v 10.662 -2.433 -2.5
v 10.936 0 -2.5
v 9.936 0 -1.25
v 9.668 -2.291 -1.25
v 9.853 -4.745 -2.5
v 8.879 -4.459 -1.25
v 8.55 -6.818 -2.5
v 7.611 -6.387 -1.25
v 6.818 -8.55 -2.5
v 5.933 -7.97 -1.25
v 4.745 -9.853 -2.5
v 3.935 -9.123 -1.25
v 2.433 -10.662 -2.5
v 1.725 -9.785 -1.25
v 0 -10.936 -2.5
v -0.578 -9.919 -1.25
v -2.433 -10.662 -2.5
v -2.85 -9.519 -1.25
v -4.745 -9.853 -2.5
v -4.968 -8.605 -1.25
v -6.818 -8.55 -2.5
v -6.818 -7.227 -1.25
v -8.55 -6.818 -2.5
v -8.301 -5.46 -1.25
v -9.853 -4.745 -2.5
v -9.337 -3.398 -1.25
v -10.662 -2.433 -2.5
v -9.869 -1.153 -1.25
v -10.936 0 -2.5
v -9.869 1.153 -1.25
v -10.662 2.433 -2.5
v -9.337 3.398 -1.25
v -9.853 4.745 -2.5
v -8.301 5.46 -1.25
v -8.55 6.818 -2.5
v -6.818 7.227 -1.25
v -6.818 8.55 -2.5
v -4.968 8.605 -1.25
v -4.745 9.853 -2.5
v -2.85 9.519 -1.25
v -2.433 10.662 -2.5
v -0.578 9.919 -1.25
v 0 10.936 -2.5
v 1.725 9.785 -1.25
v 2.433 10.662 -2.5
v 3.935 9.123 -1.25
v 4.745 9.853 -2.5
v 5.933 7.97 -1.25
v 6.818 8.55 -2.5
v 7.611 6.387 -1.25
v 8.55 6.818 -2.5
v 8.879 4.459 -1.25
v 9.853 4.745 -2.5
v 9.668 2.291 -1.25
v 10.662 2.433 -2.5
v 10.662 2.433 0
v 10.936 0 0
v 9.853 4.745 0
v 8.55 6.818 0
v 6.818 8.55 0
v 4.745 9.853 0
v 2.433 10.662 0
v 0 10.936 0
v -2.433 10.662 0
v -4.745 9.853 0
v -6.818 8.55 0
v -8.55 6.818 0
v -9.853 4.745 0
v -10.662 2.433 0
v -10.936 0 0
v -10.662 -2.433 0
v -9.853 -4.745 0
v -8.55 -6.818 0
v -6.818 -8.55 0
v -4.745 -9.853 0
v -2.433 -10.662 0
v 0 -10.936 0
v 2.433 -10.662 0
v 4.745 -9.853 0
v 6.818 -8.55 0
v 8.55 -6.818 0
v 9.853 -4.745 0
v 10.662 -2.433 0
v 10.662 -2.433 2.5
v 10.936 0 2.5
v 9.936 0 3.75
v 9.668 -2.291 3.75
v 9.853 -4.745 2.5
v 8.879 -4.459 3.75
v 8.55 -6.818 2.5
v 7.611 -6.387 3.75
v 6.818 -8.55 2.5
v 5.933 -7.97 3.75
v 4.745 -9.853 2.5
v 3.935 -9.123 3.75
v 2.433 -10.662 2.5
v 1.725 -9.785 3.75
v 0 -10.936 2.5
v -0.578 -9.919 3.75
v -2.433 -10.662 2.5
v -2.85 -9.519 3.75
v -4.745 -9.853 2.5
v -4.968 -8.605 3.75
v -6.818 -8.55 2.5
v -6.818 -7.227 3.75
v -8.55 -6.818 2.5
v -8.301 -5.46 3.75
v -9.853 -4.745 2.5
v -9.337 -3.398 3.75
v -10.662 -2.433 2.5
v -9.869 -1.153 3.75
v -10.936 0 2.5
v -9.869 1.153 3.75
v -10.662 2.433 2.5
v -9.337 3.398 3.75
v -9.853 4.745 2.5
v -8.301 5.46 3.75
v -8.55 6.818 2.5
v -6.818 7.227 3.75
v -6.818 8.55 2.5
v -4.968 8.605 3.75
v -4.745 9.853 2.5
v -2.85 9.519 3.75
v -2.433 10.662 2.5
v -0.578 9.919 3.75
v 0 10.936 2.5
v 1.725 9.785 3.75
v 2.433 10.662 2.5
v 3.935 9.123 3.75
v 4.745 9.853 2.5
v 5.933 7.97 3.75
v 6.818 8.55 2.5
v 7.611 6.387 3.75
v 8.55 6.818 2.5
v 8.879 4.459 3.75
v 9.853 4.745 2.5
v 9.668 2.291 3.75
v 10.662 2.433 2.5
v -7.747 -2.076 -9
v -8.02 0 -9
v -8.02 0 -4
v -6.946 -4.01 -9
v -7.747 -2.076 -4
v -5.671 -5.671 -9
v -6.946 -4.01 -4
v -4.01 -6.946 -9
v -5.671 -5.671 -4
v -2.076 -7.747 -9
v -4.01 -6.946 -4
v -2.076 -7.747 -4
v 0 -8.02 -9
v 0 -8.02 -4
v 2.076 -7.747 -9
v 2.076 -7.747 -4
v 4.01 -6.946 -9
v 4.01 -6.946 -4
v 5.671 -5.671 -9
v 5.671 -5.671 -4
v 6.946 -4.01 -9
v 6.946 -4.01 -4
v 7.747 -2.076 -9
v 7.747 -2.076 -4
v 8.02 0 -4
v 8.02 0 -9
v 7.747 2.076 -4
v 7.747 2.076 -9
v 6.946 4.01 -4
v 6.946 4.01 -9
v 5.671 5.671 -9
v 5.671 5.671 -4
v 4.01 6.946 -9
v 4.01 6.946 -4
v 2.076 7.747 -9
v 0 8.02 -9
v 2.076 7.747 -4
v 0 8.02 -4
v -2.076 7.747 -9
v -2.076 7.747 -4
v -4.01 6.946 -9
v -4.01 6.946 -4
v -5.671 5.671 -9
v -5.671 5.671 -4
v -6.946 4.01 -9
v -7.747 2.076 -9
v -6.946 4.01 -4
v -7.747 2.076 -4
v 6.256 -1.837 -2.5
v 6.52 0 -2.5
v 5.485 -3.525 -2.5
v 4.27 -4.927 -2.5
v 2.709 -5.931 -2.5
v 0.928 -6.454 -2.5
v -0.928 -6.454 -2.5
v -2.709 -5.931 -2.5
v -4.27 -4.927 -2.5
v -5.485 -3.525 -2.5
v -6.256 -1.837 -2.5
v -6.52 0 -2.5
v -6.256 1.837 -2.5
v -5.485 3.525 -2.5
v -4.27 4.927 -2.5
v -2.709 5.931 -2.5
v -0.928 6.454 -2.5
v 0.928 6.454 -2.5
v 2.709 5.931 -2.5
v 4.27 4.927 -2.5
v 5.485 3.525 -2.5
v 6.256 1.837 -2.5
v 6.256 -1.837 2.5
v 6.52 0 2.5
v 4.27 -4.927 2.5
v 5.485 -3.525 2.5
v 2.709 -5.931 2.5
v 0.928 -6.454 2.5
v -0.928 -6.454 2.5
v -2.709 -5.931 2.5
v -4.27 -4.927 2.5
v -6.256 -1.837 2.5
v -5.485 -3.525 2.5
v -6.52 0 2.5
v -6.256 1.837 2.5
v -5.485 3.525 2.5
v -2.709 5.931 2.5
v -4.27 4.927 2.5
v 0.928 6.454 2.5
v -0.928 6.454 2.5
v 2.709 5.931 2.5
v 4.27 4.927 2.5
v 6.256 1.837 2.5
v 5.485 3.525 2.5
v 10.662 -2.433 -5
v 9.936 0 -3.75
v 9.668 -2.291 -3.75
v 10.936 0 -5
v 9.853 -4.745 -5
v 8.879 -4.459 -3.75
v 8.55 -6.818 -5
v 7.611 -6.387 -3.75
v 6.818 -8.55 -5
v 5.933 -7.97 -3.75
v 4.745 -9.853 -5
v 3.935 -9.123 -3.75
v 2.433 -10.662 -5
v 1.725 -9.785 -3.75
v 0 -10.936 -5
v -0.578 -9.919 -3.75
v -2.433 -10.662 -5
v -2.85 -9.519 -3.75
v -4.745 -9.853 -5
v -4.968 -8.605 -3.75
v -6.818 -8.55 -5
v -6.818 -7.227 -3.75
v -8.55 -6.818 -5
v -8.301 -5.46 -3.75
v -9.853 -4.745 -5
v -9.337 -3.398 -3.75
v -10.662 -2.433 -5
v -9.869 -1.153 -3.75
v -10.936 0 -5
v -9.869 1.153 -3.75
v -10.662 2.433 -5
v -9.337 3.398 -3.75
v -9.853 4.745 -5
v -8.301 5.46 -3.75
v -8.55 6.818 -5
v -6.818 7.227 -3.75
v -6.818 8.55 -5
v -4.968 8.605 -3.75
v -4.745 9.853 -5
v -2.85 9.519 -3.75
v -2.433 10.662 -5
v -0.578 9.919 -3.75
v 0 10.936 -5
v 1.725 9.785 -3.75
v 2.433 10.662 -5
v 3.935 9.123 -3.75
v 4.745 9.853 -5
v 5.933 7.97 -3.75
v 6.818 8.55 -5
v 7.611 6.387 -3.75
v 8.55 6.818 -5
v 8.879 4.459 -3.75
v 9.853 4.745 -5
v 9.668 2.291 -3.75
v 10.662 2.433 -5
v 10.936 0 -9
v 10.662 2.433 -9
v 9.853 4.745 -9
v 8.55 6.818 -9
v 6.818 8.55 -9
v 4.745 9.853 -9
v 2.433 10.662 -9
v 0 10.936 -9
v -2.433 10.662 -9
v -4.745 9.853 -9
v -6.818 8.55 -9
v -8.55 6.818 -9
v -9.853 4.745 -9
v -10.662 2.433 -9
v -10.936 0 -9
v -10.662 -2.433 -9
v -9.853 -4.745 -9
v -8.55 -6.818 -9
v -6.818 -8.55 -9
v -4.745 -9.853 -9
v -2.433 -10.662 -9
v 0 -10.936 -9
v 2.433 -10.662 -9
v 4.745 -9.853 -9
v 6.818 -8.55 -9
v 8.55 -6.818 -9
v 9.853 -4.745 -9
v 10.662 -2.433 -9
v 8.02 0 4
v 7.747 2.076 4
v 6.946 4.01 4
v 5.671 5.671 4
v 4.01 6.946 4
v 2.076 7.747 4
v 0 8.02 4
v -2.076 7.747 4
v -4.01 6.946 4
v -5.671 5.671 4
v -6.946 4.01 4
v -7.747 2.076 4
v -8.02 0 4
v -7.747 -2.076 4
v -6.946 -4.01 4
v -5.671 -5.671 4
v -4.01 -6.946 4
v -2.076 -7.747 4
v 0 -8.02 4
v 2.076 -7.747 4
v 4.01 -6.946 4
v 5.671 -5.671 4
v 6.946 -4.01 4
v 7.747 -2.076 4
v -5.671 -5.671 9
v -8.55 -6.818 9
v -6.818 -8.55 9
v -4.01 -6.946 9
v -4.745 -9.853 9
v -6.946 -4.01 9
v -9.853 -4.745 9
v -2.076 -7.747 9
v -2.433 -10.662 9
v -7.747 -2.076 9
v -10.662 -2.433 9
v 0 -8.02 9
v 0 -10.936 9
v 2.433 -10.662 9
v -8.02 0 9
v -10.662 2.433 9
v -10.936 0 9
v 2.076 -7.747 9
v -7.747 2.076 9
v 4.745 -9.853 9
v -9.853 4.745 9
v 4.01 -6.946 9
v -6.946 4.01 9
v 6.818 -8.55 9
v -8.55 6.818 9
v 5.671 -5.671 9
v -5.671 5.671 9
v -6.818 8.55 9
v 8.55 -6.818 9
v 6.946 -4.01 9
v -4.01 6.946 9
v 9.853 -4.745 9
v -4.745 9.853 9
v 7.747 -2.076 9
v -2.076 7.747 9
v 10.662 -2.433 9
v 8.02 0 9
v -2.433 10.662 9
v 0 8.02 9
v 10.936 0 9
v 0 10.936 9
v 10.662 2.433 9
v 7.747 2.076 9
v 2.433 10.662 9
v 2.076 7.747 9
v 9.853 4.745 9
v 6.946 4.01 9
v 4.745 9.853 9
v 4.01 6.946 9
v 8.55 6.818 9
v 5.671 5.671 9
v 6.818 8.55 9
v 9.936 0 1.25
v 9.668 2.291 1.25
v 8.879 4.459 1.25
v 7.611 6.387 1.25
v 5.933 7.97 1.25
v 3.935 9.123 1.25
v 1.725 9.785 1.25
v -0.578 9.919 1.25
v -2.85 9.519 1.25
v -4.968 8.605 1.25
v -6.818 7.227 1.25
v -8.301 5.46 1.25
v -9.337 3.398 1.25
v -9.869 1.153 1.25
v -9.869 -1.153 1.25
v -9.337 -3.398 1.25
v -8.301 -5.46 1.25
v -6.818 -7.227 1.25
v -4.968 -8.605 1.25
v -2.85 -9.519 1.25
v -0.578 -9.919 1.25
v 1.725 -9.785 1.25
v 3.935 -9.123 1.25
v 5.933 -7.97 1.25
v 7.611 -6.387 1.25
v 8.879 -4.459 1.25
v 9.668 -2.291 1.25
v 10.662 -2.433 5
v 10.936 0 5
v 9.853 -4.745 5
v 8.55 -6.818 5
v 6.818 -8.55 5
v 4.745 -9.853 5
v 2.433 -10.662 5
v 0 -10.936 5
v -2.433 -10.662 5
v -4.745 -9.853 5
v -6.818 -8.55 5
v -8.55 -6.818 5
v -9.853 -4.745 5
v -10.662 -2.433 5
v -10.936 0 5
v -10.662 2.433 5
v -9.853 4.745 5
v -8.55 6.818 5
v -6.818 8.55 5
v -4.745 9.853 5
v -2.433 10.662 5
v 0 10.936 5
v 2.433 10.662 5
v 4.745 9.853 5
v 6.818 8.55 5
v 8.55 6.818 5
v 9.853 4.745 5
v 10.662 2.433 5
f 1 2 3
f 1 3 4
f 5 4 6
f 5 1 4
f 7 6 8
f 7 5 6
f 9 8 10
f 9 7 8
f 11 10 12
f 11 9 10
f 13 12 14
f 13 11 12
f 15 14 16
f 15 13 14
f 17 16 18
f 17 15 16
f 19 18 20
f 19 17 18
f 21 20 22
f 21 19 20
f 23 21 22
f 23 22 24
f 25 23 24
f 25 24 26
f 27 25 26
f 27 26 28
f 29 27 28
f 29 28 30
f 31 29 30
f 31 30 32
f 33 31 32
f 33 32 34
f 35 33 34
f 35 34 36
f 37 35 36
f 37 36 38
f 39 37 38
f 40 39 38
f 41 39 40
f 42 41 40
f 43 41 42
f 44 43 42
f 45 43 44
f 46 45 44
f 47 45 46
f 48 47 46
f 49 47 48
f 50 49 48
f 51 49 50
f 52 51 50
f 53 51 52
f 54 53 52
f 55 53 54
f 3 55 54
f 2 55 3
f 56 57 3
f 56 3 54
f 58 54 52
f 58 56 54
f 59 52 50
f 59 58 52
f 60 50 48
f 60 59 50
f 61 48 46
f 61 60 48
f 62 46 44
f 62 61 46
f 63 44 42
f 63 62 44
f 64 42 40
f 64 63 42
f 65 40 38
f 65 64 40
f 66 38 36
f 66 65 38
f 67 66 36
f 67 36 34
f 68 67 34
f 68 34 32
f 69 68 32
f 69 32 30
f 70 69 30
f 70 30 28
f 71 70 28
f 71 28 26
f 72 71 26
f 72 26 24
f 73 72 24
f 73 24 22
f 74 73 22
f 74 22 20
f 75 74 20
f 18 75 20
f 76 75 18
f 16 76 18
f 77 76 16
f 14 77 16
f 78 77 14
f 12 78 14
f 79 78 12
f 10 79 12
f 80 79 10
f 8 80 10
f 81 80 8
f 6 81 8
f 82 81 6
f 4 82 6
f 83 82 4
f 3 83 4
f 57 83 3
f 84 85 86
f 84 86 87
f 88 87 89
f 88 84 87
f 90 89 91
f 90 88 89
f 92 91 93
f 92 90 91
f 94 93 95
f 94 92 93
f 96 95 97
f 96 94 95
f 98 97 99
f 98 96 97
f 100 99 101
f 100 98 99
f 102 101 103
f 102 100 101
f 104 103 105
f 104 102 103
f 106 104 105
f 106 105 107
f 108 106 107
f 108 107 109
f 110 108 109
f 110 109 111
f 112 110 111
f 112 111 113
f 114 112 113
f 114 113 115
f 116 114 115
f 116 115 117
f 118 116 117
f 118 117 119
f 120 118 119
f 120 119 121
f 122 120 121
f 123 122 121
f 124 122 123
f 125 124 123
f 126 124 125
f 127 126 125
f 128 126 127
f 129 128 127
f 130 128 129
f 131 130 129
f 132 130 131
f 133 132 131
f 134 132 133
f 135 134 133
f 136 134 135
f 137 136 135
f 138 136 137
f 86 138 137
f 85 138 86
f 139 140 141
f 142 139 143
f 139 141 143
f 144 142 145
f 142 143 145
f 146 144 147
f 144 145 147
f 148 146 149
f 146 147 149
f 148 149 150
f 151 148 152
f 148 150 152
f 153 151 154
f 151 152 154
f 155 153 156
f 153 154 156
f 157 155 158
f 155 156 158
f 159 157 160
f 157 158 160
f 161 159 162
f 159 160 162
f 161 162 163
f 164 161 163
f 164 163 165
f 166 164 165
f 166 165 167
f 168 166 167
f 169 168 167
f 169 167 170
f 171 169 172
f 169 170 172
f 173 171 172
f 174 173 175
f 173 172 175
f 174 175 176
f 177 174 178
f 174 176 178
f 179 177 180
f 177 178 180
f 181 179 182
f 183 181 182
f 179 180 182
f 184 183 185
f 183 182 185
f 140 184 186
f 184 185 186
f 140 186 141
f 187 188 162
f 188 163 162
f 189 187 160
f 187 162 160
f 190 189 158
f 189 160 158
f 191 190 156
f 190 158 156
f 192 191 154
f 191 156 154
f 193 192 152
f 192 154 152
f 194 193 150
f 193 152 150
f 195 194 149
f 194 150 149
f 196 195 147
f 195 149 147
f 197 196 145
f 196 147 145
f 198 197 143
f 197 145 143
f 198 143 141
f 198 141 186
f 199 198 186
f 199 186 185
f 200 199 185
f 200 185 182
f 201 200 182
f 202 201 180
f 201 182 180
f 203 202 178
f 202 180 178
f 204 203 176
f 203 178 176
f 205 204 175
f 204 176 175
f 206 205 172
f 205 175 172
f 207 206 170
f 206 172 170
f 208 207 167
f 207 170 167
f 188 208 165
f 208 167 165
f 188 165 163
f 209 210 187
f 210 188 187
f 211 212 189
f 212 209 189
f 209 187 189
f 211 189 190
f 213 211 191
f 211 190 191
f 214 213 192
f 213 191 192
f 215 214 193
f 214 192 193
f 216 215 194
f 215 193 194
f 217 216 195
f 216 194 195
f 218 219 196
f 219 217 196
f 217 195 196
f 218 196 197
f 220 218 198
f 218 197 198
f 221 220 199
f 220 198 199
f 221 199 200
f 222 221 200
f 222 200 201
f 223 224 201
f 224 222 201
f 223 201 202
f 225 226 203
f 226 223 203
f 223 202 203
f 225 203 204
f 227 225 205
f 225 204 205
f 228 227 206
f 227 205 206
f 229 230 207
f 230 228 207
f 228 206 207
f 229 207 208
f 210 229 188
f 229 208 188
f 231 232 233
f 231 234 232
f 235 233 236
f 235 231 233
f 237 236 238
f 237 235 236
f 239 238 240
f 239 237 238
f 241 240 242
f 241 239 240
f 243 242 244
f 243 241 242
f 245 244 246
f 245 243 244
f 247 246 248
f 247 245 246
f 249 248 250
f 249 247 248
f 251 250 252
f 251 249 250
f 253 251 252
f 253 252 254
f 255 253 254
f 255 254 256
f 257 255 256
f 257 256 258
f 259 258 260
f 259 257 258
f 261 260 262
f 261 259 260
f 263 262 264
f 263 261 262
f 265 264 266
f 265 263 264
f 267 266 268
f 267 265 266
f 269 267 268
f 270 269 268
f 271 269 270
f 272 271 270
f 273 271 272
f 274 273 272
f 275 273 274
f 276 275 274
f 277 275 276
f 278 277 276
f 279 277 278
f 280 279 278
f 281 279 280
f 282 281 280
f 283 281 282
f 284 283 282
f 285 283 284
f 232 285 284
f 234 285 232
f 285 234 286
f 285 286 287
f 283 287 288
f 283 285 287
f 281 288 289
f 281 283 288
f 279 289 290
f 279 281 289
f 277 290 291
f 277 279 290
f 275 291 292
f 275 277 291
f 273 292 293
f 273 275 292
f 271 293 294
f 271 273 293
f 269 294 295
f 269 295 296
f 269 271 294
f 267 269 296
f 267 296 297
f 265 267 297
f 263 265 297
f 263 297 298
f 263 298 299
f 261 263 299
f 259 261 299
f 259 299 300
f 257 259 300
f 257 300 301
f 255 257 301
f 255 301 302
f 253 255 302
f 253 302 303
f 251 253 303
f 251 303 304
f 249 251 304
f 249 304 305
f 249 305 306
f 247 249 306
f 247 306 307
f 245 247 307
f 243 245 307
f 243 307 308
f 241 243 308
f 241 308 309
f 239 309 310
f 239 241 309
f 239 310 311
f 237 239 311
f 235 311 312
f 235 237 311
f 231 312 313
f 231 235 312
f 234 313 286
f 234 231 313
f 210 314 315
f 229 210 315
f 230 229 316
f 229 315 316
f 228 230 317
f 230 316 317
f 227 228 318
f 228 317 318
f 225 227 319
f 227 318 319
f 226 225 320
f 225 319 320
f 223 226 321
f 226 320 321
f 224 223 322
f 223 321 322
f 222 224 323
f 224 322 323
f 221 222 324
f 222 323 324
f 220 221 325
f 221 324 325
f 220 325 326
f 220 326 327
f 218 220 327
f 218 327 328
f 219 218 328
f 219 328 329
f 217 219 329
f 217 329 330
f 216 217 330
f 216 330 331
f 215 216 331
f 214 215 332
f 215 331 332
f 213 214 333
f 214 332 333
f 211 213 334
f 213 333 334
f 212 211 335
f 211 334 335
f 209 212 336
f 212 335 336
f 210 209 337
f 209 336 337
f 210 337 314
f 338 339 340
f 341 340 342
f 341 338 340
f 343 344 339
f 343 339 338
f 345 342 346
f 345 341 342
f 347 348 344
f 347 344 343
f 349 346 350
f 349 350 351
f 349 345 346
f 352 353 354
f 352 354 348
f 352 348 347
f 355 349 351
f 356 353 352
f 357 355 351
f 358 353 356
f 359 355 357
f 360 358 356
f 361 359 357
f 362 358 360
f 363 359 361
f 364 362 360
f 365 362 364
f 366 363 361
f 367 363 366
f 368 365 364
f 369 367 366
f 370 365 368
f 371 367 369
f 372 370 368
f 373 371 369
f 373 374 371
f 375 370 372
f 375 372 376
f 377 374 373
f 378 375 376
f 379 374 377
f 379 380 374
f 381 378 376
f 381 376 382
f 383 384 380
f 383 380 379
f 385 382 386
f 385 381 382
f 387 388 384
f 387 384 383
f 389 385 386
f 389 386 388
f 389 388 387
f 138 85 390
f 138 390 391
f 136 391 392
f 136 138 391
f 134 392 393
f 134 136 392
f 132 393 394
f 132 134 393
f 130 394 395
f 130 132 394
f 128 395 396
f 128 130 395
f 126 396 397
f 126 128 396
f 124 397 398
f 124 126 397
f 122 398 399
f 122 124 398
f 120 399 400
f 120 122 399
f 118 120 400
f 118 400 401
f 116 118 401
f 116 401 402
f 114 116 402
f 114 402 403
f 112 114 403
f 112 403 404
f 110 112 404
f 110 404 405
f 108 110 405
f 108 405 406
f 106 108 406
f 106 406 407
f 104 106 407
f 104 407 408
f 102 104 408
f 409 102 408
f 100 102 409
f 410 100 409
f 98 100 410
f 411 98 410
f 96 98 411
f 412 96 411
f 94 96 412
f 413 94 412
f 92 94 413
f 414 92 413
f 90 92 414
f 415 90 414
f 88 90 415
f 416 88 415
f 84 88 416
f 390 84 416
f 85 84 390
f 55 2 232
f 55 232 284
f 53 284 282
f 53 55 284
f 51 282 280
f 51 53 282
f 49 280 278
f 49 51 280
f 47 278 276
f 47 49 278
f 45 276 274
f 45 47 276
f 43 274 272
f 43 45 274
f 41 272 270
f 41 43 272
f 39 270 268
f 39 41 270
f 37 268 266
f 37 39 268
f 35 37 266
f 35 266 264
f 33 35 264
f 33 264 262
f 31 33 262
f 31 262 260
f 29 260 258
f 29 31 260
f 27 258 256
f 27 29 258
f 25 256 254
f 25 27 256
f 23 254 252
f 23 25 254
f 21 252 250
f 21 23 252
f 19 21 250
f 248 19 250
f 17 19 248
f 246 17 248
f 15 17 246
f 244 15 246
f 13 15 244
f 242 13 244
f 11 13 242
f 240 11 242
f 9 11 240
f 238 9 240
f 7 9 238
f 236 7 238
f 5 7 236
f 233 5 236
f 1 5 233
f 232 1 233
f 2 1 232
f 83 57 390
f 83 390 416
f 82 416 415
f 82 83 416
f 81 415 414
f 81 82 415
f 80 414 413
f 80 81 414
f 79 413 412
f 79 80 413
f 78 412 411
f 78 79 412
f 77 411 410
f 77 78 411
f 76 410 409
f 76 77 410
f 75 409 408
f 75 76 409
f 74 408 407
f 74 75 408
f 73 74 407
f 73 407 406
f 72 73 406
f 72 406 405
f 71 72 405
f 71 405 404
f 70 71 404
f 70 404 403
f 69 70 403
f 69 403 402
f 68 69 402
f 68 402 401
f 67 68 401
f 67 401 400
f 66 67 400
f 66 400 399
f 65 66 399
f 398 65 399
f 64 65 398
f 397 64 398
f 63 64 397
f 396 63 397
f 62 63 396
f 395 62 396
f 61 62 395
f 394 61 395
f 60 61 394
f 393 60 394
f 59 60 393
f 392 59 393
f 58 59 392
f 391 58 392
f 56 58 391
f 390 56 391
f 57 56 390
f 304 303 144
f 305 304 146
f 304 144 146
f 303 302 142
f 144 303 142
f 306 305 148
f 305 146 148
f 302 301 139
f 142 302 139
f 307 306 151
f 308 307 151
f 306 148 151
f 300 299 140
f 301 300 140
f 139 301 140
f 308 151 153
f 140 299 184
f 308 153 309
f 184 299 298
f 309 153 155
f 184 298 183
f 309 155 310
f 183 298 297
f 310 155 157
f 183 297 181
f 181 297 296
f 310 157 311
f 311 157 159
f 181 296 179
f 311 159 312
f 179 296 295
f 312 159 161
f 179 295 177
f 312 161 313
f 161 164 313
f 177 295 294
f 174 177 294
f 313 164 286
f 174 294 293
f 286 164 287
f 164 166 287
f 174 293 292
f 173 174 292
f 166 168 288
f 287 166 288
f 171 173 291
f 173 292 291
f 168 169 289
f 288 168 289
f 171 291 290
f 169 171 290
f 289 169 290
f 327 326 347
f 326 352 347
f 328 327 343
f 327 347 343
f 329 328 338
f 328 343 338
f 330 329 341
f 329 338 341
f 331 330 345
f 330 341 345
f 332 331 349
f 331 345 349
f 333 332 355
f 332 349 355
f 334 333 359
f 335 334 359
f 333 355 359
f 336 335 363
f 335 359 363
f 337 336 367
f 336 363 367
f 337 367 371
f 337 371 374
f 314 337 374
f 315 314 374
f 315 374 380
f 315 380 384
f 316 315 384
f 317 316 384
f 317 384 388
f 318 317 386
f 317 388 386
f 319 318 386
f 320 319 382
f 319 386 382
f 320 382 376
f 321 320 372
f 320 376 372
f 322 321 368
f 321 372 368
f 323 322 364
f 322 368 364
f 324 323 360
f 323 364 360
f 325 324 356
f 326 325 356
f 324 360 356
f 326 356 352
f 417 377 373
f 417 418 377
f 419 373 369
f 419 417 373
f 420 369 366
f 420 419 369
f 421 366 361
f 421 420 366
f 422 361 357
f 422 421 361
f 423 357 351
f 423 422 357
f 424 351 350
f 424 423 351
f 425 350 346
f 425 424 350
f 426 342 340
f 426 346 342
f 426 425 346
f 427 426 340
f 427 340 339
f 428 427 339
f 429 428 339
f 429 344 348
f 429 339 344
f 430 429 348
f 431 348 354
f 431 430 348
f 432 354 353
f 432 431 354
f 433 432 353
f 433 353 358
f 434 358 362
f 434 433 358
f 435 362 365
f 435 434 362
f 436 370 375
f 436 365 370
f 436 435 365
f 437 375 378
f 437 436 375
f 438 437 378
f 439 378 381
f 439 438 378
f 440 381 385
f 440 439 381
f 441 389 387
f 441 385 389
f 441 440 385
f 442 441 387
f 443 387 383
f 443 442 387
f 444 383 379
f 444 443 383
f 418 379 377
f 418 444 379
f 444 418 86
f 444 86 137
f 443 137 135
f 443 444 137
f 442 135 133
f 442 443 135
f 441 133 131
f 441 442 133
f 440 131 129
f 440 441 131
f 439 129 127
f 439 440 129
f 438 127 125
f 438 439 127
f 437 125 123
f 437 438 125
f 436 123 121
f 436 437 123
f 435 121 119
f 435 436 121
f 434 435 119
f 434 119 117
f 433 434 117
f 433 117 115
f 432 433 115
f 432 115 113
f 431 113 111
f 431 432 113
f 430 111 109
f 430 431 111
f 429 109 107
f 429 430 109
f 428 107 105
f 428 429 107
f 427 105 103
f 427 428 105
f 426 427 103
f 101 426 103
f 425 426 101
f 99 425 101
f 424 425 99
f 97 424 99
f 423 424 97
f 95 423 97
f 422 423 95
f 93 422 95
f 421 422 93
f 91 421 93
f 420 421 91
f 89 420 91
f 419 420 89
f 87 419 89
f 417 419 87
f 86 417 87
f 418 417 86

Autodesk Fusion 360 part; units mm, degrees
sketch "Sketch1" plane through (0, 0, 0) normal (0, 0, 1) x (1, 0, 0)
  circle A0 centre (0, 0) radius 10.936
  dimension "d1" = 21.872
extrude "Extrude1" add sketch "Sketch1" along normal mid plane 18
sketch "Sketch2" plane through (0, 0, 9) normal (0, 0, 1) x (-1, 0, 0)
  circle A0 centre (0, 0) radius 10.936
  circle A1 centre (0, 0) radius 8.02
  dimension "d4" = 16.04
extrude "Extrude2" cut sketch "Sketch2" against normal blind 26 contours A1
sketch "Sketch3" plane through (0, 0, 0) normal (0, 1, 0) x (1, 0, 0)
  line L0 (-10.936, -9) -> (10.936, -9) construction
  line L1 (-10.936, 9) -> (10.936, 9) construction
  line L2 (10.936, -9) -> (10.936, 9) construction
  line L3 (10.936, 0) -> (9.936, 1.25)
  line L4 (9.936, 1.25) -> (10.936, 2.5)
  line L5 (10.936, 2.5) -> (10.936, 0)
  point P0 (10.936, 1.25)
  dimension "d7" = 2.5
  dimension "d8" = 1
revolve "Revolve1" cut sketch "Sketch3" angle 360 about axis through (0, 0, 1.75) along (0, 0, 1)
pattern_linear "R-Pattern1" count 4 spacing 2.5 along (0, 0, 1) both ways of "Revolve1"
ref_plane "WorkPlane1" through (0, 0, 2) normal (0, 0, -1) x (-1, 0, 0)
sketch "Sketch5" plane through (0, 0, 0) normal (0, 1, 0) x (1, 0, 0)
  line L0 (6.52, -2.5) -> (6.52, 2.5)
  line L1 (6.52, -2.5) -> (8.02, -4)
  line L2 (6.52, 2.5) -> (8.02, 4)
  line L3 (8.02, -4) -> (8.02, 4)
  point P0 (8.02, -9)
  point P1 (8.02, 9)
  point P2 (6.52, 0)
  dimension "d18" = 45
  dimension "d19" = 45
  dimension "d20" = 5
  dimension "d21" = 1.5
revolve "Revolve2" add sketch "Sketch5" angle 360 about axis through (0, 0, 1.75) along (0, 0, 1)
equation "d1 = 20.372 mm + 2 * teeth - 0.5 mm"
equation "d8 = teeth"
equation "teeth = 1 mm"
